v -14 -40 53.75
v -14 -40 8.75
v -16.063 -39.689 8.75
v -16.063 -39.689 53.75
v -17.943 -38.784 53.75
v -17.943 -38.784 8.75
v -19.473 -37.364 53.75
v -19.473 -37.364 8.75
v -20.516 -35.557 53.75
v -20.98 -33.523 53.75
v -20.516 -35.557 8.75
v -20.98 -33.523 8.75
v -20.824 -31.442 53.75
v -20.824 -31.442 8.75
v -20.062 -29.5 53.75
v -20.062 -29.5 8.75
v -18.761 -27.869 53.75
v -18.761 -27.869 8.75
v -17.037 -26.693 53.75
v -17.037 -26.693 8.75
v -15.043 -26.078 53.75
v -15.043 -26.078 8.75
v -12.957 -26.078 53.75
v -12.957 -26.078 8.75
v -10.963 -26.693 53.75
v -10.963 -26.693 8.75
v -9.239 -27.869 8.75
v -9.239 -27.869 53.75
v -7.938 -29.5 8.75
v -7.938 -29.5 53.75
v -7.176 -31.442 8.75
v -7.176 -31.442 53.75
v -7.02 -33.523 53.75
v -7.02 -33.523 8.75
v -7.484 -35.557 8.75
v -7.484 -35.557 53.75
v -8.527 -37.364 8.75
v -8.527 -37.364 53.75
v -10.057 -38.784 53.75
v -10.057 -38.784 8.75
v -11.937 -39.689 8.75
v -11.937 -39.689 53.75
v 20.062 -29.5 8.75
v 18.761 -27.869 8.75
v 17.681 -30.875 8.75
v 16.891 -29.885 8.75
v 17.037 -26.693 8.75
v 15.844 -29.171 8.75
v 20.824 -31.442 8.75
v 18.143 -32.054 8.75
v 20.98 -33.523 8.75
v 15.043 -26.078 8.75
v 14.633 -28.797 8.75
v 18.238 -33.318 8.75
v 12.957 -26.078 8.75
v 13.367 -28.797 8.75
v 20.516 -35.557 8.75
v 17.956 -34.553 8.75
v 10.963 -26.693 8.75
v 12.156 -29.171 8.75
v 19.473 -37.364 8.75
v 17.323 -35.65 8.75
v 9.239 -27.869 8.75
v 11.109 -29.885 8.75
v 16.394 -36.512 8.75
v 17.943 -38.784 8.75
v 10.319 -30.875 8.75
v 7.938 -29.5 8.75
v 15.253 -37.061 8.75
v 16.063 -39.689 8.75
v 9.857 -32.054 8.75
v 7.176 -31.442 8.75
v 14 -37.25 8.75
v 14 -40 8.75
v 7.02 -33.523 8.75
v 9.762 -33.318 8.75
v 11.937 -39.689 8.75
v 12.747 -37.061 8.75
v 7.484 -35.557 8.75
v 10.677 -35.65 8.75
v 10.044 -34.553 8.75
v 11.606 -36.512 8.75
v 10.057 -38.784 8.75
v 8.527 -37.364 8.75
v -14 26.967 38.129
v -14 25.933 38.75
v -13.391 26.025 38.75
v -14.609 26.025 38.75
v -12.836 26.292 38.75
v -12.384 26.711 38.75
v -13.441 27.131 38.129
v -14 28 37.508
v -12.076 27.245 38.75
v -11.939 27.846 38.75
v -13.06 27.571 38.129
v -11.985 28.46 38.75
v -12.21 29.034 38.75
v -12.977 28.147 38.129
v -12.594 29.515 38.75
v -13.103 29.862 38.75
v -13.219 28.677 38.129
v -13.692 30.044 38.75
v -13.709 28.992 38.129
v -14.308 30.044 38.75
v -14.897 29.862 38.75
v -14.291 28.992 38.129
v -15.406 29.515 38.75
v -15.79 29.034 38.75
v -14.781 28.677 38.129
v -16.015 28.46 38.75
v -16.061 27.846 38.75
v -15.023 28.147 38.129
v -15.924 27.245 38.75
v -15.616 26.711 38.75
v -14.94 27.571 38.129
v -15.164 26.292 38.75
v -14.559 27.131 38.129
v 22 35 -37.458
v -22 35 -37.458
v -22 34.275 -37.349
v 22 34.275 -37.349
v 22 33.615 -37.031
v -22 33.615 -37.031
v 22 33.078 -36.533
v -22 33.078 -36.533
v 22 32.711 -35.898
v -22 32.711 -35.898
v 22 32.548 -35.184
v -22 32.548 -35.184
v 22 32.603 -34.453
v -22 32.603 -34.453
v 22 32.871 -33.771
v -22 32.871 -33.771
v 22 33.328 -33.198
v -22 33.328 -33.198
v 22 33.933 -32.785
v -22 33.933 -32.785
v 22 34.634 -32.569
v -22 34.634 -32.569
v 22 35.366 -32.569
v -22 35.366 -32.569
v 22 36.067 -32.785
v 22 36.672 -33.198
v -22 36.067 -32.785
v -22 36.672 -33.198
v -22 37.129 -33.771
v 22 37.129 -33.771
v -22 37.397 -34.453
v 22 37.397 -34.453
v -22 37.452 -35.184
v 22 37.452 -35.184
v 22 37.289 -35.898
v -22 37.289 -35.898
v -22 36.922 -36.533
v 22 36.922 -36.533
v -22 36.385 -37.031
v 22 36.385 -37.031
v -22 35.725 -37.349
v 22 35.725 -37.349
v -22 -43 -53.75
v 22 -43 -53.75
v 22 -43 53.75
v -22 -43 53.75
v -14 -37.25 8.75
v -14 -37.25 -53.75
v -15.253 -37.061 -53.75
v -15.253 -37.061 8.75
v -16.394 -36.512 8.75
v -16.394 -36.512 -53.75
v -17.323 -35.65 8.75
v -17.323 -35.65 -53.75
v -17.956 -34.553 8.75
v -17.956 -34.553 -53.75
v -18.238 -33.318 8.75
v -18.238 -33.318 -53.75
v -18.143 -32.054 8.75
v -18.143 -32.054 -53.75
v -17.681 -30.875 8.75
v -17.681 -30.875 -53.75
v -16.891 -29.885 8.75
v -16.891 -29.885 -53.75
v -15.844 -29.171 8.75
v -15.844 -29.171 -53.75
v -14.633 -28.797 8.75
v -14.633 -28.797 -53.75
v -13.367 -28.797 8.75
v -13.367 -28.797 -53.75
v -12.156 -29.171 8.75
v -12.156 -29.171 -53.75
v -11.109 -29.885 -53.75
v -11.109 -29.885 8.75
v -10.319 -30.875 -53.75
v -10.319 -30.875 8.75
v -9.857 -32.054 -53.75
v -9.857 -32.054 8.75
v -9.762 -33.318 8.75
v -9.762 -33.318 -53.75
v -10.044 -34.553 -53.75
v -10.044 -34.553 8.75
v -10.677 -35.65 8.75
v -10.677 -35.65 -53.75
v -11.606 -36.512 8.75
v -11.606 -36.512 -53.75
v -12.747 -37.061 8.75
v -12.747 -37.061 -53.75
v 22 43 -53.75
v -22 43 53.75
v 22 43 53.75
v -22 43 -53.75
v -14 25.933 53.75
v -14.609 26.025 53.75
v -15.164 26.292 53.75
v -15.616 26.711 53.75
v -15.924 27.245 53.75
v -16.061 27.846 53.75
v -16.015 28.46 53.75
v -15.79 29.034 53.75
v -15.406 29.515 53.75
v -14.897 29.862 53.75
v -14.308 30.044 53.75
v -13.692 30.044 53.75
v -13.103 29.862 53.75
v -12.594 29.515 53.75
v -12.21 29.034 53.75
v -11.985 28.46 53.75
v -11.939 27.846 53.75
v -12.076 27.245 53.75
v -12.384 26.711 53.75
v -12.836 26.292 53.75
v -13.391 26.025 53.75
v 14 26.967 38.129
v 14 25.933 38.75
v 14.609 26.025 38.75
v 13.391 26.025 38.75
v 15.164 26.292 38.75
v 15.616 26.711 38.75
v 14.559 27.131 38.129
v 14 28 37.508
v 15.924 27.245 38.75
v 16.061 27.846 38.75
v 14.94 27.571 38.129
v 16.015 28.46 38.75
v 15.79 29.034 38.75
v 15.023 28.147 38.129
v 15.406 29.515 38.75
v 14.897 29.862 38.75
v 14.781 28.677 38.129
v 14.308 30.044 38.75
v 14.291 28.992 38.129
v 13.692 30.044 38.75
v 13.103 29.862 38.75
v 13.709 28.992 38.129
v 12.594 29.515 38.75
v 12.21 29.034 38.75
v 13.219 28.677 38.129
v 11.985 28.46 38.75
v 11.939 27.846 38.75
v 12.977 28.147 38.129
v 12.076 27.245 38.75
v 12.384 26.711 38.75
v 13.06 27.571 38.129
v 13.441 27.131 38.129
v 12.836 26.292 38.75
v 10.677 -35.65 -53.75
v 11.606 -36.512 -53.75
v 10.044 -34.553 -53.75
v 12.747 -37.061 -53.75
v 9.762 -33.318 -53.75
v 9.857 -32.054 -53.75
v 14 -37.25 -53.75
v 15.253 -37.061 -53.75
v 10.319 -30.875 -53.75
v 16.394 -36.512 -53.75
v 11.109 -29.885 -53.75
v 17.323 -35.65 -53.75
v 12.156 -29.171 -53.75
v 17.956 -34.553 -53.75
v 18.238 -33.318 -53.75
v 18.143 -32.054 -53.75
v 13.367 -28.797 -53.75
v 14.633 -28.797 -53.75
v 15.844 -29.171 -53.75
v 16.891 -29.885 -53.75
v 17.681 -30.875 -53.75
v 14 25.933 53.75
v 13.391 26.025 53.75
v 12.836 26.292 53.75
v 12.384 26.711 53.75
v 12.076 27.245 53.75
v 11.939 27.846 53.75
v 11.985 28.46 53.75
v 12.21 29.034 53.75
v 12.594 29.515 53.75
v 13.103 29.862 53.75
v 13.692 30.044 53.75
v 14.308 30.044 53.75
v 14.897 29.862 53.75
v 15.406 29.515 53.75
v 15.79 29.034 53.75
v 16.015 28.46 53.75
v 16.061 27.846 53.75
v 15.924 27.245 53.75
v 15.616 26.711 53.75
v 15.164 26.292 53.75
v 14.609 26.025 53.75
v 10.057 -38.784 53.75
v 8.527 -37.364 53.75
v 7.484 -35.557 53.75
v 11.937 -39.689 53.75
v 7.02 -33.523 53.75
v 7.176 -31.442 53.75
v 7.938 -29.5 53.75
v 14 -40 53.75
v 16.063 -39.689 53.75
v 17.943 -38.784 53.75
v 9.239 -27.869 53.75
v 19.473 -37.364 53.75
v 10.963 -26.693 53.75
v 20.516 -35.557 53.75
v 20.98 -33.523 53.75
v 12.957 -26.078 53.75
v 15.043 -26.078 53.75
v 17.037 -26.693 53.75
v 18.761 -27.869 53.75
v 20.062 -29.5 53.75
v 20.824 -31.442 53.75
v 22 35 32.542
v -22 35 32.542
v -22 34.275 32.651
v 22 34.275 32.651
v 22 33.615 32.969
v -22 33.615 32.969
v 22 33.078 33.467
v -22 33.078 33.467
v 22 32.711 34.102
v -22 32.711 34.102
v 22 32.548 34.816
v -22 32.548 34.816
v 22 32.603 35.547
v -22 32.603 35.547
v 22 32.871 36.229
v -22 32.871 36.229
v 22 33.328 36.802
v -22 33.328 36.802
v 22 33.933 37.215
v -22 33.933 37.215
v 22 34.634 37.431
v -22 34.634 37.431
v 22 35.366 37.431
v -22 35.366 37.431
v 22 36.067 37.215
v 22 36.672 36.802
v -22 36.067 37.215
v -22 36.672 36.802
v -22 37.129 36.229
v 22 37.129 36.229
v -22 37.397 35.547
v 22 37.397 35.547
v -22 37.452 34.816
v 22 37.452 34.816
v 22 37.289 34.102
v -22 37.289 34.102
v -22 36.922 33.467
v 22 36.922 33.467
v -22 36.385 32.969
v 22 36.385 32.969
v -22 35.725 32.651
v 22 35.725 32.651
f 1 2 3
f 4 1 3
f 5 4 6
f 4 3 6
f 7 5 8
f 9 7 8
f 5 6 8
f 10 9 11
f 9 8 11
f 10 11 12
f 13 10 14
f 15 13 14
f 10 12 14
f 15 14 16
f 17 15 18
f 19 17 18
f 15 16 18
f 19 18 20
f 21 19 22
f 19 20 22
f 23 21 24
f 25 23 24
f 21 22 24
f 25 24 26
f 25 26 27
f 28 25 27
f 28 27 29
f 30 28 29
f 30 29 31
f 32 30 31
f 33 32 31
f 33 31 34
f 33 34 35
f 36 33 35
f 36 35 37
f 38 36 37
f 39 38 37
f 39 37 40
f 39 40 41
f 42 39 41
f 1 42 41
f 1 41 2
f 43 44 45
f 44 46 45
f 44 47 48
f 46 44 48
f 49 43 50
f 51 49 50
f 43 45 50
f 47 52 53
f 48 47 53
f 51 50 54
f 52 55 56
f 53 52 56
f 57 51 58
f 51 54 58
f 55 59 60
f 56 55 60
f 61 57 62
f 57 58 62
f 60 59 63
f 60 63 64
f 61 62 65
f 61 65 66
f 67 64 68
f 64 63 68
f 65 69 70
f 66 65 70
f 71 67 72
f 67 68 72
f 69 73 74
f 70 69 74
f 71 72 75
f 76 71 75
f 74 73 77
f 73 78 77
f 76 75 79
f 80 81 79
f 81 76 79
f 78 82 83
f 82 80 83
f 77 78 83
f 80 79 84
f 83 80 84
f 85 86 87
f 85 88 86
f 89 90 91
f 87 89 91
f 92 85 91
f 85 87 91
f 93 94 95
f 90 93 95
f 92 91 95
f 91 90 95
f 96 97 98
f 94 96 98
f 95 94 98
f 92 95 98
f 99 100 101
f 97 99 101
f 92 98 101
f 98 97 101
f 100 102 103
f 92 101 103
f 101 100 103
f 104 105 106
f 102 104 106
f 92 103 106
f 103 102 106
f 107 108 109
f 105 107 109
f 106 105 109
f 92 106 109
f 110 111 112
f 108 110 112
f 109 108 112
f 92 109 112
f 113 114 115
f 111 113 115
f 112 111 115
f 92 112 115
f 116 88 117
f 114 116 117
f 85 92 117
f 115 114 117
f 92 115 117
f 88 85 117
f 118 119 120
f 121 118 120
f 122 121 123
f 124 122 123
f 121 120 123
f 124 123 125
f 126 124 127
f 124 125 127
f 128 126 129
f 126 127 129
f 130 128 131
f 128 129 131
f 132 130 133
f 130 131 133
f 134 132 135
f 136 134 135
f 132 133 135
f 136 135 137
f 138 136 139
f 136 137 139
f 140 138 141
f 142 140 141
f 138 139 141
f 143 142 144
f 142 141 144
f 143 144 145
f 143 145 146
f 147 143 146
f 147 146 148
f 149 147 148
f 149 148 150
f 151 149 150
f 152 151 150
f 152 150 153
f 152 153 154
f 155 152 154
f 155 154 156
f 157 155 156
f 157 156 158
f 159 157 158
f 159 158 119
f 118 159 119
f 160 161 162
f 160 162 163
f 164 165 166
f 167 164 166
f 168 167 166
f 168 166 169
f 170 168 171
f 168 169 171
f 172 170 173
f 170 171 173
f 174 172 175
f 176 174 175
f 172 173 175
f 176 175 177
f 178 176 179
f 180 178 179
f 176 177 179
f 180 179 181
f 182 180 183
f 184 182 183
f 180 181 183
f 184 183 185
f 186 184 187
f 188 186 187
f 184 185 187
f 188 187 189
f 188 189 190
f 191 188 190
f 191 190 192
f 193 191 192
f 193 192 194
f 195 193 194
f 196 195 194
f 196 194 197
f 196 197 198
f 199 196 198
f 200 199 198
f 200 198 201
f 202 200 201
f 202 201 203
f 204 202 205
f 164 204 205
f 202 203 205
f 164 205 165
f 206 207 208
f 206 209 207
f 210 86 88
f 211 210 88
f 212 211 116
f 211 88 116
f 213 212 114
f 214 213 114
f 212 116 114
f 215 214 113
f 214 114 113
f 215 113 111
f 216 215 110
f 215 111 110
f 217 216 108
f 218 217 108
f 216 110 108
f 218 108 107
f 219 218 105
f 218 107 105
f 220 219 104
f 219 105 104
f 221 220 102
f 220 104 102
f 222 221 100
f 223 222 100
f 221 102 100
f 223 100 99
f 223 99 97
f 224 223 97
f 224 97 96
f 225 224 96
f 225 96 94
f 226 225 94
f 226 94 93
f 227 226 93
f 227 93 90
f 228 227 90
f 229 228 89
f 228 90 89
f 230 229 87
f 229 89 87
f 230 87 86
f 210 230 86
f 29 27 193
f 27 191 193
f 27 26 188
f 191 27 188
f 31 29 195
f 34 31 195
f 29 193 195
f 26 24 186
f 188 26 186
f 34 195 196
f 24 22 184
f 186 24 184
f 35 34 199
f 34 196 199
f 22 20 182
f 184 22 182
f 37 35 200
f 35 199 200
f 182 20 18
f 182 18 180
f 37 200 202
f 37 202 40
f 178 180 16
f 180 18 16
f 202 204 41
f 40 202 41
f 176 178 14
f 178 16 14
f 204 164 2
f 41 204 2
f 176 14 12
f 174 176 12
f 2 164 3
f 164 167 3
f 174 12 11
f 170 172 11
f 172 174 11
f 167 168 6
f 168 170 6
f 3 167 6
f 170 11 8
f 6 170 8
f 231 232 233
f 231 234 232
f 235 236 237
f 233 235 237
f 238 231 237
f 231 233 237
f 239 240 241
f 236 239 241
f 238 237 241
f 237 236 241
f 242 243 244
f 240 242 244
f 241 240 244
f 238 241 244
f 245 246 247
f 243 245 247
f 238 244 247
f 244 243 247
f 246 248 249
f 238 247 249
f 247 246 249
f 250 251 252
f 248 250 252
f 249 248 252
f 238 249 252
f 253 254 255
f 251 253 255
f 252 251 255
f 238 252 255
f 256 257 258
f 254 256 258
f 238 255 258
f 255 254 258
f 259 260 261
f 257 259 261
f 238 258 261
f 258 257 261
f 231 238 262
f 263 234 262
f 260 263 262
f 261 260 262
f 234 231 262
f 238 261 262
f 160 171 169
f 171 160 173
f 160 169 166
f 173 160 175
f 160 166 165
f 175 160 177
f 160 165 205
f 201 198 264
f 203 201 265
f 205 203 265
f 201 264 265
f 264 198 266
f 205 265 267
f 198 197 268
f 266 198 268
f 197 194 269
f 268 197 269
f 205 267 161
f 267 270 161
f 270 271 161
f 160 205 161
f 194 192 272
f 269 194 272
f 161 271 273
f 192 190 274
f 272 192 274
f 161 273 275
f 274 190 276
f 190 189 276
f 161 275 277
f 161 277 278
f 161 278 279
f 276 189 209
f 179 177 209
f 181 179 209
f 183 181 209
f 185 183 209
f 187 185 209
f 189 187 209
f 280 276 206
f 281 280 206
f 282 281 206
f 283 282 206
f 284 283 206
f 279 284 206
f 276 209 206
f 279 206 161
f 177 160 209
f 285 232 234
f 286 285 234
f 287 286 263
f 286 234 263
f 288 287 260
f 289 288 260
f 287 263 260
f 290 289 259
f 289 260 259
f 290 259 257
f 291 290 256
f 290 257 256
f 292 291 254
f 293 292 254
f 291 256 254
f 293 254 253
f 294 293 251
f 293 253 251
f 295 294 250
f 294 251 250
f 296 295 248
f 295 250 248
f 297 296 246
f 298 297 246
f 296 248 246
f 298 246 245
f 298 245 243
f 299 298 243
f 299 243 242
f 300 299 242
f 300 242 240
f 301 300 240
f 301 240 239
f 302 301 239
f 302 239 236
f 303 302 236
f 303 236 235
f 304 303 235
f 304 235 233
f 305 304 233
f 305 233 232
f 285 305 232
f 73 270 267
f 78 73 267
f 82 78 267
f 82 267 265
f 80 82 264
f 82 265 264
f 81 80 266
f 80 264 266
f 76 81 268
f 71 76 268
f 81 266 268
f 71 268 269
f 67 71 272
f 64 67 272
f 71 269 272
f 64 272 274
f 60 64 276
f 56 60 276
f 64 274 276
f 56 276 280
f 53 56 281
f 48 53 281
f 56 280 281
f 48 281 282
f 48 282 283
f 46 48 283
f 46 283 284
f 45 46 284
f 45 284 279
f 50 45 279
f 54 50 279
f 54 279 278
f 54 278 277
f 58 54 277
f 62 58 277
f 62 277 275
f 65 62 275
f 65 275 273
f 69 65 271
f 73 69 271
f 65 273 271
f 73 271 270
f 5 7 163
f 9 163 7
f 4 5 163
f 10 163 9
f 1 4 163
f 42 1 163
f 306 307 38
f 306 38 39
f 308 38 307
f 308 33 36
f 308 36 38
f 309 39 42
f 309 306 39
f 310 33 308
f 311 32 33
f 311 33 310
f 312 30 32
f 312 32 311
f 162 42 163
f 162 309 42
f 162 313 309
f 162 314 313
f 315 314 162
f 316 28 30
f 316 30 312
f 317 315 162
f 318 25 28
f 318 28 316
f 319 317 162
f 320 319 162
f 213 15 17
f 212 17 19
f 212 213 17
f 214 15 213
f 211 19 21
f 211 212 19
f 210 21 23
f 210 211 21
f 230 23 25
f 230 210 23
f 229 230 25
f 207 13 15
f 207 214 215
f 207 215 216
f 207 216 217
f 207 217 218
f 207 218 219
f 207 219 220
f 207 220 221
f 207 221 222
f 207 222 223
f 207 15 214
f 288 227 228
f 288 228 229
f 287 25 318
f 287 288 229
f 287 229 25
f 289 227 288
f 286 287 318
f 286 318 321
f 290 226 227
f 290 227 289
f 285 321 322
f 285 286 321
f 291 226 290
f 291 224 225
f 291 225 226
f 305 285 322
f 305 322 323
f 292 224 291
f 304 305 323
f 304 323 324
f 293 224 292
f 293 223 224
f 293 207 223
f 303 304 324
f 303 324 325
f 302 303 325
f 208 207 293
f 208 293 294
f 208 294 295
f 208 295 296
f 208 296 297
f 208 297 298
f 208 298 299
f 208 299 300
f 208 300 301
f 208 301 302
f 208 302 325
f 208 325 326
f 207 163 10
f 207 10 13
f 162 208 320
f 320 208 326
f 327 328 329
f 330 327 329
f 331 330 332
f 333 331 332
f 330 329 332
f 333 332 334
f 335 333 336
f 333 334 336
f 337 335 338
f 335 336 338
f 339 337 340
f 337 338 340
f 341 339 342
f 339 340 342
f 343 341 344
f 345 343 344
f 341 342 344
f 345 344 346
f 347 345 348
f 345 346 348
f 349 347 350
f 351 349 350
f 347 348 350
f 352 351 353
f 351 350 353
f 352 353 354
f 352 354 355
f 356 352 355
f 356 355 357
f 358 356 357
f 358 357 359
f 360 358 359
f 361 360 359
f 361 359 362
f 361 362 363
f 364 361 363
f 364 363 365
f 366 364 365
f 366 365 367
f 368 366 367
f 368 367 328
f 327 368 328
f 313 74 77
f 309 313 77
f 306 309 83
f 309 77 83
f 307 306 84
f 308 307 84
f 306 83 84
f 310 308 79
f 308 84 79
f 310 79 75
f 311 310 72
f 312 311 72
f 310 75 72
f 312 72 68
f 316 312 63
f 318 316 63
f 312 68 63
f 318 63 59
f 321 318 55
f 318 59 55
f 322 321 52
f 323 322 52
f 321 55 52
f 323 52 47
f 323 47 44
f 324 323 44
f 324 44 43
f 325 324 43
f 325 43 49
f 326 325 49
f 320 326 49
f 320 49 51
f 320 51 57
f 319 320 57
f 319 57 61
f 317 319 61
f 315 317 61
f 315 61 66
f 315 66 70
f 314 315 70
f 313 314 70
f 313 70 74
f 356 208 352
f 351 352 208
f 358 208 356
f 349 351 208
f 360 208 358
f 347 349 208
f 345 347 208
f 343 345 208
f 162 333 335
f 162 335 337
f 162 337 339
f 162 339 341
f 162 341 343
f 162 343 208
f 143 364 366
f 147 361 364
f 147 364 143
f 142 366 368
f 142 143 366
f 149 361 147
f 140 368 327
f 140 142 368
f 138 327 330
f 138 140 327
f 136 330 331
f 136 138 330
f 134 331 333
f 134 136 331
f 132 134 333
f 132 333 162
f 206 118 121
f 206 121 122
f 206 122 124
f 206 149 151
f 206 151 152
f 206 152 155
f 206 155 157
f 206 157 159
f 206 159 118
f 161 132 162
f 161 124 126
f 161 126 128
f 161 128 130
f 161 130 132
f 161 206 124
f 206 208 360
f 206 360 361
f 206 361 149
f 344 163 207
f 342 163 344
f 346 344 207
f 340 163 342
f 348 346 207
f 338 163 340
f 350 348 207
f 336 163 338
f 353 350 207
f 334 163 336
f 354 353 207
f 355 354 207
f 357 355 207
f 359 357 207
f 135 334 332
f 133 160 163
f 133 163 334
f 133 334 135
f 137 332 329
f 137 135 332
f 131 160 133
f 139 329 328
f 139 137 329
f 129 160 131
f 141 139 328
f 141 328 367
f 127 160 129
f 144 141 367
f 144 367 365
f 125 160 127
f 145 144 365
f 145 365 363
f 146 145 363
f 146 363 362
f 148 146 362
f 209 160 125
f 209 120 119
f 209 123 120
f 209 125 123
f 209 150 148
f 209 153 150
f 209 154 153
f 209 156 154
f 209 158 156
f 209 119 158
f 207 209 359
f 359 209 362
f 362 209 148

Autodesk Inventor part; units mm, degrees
ref_plane "YZ Plane" through (0, 0, 0) normal (1, 0, 0) x (0, 1, 0)
ref_plane "XZ Plane" through (0, 0, 0) normal (0, 1, 0) x (-1, 0, 0)
ref_plane "XY Plane" through (0, 0, 0) normal (0, 0, 1) x (1, 0, 0)
sketch "Sketch5" plane through (0, 0, 0) normal (0, 0, 1) x (1, 0, 0)
  line L0 (-22, 43) -> (22, 43)
  line L1 (22, 43) -> (22, -43)
  line L2 (22, -43) -> (-22, -43)
  line L3 (-22, -43) -> (-22, 43)
  point P0 (0, 0)
  point P1 (22, 0)
  point P2 (0, 43)
  dimension "d8" = 86
  dimension "d9" = 44
extrude "Extrusion5" add sketch "Sketch5" along normal mid plane 107.5
sketch "Sketch6" plane through (0, 0, 53.75) normal (0, 0, 1) x (1, 0, 0)
  line L0 (22, 43) -> (-22, 43) projected
  circle A0 centre (14, -33) radius 4
  circle A1 centre (-14, -33) radius 4
  circle A2 centre (-14, -33) radius 8.5
  point P0 (0, 0)
  dimension "d12" = 76
  dimension "d13" = 28
  dimension "d14" = 14
  dimension "d15" = 8
  dimension "d17" = 17
hole "Hole1" at (-14, -33, 53.75) at (14, -33, 53.75) direction (0, 0, -1) diameter 8.5 end through all counterbore diameter 14 counterbore depth 45 clearance for "Socket Head Cap Screw DIN EN ISO 4762" size "M8" standard "DIN"
sketch "Sketch7" plane through (22, -43, 53.75) normal (1, 0, 0) x (0, 0, -1)
  line L0 (0, 86) -> (107.5, 86) projected
  circle A0 centre (18.75, 78) radius 3
  circle A1 centre (88.75, 78) radius 3
  point P0 (53.75, 43)
  dimension "d25" = 8
  dimension "d26" = 70
  dimension "d27" = 35
  dimension "d28" = 6
  dimension "d45" = 107.5
  dimension "d46" = 18.75
hole "Hole2" at (22, 35, 35) at (22, 35, -35) direction (-1, 0, 0) diameter 4.917 end through all thread size "M6x1" class "6H" standard "ANSI Metric M Profile"
sketch "Sketch8" plane through (0, 0, 53.75) normal (0, 0, 1) x (1, 0, 0)
  circle A0 centre (-14, -33) radius 7 projected
  circle A1 centre (14, -33) radius 7 projected
  line L0 (22, 43) -> (-22, 43) projected
  circle A2 centre (14, 28) radius 4
  circle A3 centre (-14, 28) radius 4
  point P0 (0, 0)
  dimension "d36" = 15
  dimension "d37" = 8
hole "Hole3" at (-14, 28, 53.75) at (14, 28, 53.75) direction (0, 0, -1) diameter 4.134 depth 15 tip angle 118 thread size "M5x0.8" class "6H" standard "ANSI Metric M Profile"
equation "\"d14\" = 0.5 * d13"
equation "\"d27\" = 0.5 * d26"
properties part number "BC-10015" material "Alumínio 7075"
